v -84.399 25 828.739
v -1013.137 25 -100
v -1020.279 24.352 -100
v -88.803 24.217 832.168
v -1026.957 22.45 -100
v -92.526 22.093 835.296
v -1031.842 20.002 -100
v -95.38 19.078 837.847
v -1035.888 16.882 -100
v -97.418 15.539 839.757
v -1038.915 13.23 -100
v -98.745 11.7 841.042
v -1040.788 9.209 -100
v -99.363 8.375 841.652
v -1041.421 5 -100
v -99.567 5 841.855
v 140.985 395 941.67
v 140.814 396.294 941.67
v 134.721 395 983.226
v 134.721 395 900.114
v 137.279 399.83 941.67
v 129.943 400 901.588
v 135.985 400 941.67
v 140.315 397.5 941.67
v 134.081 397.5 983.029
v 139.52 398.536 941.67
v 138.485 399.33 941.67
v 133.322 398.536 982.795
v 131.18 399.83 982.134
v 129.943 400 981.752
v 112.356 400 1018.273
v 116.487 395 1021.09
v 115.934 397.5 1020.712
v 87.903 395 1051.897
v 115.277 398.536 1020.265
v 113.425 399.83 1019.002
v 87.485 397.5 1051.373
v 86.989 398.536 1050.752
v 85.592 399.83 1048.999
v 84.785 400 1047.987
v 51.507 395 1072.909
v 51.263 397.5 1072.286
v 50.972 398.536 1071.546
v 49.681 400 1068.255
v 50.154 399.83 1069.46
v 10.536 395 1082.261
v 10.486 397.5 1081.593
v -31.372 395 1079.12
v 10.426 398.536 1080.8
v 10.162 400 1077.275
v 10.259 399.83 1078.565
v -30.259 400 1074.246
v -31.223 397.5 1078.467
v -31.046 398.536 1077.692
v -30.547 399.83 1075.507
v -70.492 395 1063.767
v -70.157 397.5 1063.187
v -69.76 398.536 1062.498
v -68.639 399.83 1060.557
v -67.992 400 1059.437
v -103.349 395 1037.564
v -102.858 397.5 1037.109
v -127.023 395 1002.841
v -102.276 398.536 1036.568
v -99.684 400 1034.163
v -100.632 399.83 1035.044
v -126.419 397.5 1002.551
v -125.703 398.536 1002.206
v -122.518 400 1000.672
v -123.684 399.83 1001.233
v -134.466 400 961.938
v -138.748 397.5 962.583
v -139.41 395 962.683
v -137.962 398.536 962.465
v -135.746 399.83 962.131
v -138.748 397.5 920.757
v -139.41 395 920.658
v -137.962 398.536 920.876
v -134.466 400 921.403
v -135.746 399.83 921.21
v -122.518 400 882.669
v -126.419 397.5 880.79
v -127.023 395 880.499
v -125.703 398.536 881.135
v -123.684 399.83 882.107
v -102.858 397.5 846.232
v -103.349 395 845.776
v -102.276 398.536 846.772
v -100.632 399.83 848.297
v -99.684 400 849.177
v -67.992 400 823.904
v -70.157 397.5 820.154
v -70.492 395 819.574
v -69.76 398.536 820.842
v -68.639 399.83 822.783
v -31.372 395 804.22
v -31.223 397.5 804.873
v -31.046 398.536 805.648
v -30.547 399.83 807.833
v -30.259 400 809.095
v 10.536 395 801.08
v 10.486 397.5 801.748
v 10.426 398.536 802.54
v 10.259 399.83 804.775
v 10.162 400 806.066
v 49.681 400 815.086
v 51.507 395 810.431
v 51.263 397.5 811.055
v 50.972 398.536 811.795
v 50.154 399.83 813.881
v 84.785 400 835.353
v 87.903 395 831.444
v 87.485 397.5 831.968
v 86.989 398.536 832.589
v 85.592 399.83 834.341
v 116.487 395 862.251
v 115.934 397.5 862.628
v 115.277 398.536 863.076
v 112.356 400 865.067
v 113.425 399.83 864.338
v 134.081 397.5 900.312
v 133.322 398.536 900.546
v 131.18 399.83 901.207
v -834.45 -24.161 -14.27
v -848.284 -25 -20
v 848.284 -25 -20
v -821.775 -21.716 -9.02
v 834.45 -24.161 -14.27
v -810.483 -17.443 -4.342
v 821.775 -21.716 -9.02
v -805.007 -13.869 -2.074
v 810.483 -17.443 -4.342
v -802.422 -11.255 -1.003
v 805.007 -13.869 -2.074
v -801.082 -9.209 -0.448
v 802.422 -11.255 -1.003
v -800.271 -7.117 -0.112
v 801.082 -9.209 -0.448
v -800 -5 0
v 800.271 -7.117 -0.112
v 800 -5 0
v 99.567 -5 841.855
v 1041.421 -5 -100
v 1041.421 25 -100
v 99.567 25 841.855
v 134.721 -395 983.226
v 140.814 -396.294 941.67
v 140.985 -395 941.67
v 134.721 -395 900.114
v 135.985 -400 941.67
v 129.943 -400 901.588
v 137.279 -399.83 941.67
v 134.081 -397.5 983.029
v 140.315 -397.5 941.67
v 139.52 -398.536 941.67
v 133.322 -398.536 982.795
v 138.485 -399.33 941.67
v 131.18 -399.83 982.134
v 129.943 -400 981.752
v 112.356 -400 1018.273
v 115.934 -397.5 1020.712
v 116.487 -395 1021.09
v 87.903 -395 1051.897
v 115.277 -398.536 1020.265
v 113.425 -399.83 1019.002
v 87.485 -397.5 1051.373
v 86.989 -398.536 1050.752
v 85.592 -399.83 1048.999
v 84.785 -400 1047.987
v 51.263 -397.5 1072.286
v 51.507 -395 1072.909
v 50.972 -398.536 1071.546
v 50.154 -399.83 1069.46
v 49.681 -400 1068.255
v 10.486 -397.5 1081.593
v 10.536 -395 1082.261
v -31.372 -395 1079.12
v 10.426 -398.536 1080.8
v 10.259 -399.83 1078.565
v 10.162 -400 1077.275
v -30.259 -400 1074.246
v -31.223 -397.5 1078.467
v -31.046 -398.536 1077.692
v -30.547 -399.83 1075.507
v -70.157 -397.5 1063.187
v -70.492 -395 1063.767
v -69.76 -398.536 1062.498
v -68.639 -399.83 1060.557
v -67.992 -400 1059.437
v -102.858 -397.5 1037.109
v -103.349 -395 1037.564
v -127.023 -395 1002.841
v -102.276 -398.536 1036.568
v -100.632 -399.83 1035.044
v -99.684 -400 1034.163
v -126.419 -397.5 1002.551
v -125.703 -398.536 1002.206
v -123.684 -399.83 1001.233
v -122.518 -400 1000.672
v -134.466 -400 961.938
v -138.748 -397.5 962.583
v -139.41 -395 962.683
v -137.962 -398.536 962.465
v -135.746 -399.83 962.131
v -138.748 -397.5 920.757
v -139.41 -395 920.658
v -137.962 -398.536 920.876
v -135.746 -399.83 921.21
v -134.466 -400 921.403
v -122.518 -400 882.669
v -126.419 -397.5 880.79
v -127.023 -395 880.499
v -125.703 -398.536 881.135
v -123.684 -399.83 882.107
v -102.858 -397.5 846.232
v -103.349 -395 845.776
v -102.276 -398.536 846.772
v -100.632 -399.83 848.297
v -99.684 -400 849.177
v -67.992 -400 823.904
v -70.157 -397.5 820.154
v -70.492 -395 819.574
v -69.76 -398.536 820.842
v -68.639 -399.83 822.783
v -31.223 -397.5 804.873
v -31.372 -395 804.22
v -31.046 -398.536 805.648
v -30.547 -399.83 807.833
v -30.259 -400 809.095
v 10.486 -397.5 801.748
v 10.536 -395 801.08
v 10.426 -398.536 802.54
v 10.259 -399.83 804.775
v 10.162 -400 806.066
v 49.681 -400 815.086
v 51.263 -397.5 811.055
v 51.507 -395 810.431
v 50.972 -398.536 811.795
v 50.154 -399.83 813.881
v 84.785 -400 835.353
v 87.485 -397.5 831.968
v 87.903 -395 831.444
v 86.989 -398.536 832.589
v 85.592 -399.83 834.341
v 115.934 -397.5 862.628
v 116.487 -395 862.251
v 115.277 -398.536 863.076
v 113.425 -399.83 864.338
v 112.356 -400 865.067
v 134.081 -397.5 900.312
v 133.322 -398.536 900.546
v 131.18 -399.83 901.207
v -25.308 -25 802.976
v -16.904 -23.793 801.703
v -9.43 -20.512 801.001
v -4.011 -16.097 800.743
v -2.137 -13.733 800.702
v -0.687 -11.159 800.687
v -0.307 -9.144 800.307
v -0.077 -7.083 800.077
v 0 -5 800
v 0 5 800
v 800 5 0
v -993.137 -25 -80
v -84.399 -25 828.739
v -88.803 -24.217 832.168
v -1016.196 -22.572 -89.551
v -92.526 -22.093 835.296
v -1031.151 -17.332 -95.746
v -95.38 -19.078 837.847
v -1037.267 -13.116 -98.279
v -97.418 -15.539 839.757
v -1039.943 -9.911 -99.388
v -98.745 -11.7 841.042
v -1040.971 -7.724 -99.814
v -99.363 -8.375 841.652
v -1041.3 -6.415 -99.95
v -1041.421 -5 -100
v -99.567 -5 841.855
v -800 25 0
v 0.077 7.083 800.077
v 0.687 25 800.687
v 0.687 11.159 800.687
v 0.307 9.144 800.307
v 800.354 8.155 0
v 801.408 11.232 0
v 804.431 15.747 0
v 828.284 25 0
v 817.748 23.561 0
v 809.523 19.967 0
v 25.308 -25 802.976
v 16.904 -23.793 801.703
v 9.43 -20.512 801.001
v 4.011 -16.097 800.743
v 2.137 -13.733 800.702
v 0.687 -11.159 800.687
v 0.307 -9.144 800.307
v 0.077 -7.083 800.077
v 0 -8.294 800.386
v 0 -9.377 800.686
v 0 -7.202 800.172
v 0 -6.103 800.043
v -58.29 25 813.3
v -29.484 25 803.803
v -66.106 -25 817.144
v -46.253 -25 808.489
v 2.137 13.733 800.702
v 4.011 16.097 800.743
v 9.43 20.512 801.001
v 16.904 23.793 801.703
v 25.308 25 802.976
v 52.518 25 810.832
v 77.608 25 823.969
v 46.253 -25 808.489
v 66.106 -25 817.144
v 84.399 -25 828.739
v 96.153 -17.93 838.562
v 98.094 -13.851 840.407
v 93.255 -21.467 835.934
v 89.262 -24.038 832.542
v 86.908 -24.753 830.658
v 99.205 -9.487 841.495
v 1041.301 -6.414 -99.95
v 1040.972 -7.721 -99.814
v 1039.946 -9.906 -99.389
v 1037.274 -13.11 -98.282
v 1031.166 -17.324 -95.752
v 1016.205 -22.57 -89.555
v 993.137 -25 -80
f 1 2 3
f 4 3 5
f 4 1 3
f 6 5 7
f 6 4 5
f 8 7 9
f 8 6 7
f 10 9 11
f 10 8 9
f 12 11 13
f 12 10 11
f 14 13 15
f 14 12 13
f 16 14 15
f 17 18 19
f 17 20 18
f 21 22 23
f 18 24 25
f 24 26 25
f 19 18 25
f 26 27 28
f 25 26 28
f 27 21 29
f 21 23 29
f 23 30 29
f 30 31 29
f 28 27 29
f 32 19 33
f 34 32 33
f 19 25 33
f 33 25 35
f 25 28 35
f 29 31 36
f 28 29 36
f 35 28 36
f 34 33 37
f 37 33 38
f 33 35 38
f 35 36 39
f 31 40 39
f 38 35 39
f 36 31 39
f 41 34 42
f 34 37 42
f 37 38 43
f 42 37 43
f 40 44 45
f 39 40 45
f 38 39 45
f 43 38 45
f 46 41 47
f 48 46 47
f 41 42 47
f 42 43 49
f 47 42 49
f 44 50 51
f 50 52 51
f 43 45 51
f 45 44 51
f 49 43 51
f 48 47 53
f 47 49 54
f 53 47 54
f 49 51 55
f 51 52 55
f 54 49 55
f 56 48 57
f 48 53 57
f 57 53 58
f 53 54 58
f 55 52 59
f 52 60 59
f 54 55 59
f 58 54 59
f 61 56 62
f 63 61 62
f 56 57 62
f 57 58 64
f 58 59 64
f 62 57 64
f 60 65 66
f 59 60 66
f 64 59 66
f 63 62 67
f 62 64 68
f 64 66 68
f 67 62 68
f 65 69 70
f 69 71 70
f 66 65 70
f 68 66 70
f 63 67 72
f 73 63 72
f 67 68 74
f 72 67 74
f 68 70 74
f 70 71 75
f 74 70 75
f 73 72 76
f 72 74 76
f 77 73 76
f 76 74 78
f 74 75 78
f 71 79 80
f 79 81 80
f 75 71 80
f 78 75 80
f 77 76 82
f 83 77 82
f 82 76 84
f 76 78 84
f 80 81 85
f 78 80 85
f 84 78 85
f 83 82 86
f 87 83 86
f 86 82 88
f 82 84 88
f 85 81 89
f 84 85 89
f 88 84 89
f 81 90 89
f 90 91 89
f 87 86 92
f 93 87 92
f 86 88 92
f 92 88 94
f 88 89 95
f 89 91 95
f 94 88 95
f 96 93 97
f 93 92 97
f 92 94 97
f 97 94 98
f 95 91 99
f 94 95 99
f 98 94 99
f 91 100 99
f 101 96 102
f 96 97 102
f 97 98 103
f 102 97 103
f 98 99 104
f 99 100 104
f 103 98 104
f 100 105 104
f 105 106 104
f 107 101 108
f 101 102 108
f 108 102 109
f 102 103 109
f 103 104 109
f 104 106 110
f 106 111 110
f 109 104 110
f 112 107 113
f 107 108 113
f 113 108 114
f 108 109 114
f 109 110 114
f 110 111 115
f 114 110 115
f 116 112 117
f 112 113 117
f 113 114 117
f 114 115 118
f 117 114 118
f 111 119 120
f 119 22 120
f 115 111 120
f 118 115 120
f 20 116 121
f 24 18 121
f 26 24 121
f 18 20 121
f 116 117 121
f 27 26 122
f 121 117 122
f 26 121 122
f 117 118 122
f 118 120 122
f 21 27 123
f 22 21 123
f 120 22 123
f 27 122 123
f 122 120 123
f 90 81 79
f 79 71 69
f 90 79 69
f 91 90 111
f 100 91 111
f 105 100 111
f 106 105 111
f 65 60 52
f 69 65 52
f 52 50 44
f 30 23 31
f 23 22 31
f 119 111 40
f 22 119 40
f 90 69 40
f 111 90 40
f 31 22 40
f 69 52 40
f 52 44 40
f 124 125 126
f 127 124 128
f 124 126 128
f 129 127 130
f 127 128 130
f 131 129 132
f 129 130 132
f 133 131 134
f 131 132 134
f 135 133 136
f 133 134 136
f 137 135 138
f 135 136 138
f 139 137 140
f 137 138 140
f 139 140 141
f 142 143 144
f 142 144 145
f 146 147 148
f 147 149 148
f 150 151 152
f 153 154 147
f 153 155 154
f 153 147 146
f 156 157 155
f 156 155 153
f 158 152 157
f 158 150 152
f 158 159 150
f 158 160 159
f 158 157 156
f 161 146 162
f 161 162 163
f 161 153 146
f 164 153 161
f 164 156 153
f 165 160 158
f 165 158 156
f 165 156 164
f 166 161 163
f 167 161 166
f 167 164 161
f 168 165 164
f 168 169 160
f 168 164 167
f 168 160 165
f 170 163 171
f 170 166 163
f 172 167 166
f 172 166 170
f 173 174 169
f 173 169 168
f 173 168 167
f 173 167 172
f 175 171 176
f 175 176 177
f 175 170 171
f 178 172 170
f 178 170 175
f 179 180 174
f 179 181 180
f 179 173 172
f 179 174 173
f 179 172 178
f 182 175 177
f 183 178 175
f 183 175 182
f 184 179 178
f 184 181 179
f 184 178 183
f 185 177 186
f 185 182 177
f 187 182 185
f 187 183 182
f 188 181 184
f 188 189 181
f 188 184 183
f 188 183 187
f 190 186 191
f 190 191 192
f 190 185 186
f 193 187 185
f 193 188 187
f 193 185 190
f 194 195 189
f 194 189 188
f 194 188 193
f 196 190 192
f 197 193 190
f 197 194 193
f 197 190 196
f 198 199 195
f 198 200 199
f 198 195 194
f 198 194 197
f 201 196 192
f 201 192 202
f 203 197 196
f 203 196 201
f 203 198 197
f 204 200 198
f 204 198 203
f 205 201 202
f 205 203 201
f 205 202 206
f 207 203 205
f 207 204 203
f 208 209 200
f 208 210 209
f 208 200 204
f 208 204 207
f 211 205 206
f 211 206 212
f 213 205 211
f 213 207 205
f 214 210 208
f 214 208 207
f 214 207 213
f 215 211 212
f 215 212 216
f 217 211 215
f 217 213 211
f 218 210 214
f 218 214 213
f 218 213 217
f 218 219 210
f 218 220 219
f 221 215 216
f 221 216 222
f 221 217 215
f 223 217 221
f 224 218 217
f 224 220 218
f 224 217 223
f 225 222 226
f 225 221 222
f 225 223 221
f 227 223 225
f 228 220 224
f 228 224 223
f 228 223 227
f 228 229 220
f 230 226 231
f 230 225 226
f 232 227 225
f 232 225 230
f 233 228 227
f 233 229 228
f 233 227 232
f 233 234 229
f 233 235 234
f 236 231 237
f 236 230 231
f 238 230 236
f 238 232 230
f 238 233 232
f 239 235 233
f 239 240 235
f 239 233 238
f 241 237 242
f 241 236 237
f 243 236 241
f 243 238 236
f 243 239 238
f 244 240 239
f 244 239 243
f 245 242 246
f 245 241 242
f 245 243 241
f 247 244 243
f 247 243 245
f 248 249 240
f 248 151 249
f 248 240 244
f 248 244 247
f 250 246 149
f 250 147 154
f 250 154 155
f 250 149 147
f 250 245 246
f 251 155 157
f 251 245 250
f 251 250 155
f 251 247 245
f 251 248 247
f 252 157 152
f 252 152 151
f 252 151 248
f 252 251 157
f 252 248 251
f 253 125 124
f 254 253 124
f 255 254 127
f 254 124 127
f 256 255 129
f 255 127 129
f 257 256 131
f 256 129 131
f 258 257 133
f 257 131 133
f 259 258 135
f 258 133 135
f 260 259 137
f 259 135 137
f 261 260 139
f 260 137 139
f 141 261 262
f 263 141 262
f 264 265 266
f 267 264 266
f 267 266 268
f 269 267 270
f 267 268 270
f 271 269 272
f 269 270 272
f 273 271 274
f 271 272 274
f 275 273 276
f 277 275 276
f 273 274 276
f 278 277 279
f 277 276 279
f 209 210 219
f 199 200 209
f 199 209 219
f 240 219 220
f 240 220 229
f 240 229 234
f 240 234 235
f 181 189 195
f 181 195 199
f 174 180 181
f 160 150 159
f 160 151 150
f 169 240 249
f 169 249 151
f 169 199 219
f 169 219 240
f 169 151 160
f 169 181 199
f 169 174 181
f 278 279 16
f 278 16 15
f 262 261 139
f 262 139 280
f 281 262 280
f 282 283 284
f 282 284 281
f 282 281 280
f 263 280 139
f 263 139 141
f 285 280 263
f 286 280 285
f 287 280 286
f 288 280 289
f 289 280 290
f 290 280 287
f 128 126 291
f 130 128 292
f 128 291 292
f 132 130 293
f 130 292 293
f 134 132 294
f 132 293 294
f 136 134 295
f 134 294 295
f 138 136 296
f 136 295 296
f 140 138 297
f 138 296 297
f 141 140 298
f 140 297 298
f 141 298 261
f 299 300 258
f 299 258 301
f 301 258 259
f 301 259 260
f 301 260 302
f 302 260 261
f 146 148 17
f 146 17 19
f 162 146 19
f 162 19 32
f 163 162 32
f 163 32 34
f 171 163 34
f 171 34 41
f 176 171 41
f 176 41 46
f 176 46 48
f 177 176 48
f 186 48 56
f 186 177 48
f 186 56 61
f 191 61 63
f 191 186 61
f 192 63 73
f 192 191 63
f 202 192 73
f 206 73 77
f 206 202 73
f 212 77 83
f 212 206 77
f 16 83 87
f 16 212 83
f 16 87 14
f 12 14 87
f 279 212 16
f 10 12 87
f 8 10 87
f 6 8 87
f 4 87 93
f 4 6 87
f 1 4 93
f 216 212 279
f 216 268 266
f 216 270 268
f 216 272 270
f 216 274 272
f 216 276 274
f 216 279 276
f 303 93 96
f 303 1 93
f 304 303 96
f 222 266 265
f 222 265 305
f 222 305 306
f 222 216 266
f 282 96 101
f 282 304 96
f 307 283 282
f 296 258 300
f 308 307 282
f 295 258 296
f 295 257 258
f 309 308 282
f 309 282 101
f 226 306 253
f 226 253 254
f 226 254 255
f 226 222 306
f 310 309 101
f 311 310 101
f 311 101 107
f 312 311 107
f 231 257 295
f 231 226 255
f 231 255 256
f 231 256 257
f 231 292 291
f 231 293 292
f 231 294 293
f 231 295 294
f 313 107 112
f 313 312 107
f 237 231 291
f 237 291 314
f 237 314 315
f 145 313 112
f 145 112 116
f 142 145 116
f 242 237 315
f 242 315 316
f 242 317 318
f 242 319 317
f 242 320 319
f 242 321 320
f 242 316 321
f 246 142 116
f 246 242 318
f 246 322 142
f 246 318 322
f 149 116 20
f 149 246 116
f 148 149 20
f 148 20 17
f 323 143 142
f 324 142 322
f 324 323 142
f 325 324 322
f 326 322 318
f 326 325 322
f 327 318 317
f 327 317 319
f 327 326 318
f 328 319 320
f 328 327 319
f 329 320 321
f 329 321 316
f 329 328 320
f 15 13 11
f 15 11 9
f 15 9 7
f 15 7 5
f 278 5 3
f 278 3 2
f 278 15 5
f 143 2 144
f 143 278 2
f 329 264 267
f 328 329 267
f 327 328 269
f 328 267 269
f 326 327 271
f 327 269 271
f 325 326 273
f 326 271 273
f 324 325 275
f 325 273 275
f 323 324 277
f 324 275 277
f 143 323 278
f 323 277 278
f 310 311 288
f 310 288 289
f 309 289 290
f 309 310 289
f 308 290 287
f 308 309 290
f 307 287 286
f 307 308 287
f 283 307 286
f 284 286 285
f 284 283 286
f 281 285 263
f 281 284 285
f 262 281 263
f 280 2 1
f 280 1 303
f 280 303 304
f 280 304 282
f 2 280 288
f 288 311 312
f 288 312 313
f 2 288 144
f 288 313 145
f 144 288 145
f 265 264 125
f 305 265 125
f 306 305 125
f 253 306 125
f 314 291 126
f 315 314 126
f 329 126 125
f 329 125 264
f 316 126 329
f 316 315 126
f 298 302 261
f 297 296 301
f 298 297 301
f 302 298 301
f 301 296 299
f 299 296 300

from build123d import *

# Parameters (mm, degrees)
F1_R         = 140.9846966486
F2_DEPTH     = 400
F3_DEPTH     = 25
F4_T1_DEPTH  = 2182.8427124746
F4_T6_DEPTH  = 1431.9836481951
F4_S7_R      = 140.9846966486
F4_T8_DEPTH  = 728
F4_T12_DEPTH = 1181.3708498985
F4_S13_R     = 140.9846966486
F4_T14_DEPTH = 602
F4_T19_DEPTH = 1431.9836481951
F4_S20_R     = 140.9846966486
F4_T21_DEPTH = 728
F4_T25_DEPTH = 1700
F4_T31_DEPTH = 1181.3708498985
F4_S32_R     = 140.9846966486
F4_T33_DEPTH = 602
F4_T38_DEPTH = 1181.3708498985
F4_S39_R     = 140.9846966486
F4_T40_DEPTH = 602
F4_T45_DEPTH = 1431.9836481951
F4_S46_R     = 140.9846966486
F4_T47_DEPTH = 728
F4_T52_DEPTH = 1700
F4_T56_DEPTH = 1181.3708498985
F4_T63_DEPTH = 1231.3708498985
F4_S64_R     = 140.9846966486
F4_T65_DEPTH = 627
F4_T69_DEPTH = 1231.3708498985
F4_S70_R     = 140.9846966486
F4_T71_DEPTH = 627
F4_T78_DEPTH = 1700
F4_T82_DEPTH = 1181.3708498985
F5_R         = 5


# Not quite as in the source:
# - a fillet or chamfer that OpenCascade refuses, or shapes differently, is made with other operations: its cross-section is extruded or revolved along the edge and cut away or added


with BuildPart() as f2:
    # F1 (on face) → F2 (new body, symmetric)
    with BuildSketch(Plane.XZ):
        with Locations((0, 941.6702985764)):
            Circle(F1_R)
    extrude(amount=F2_DEPTH, both=True)

    # F0 (on Front) → F3 (join, symmetric)
    with BuildSketch(Plane.XZ):
        Polygon((0, -100), (1041.4213562373, -100), (0, 941.4213562373), (-1041.4213562373, -100), align=None)
        Polygon((800, 0), (0, 0), (-800, 0), (0, 800), align=None, mode=Mode.SUBTRACT)
    extrude(amount=F3_DEPTH, both=True)

    # F4: fillet of radius 20 on 8 edges, made by hand

    # F4_s2 → F4_t1 (cut)
    with BuildSketch(Plane.YZ.offset(-1091.4213562373)):
        with BuildLine():
            ThreePointArc((-25, -80), (-19.1421356237, -94.1421356237), (-5, -100))
            Line((-5, -100), (-25, -100))
            Line((-25, -100), (-25, -80))
        make_face()
    extrude(amount=F4_T1_DEPTH, mode=Mode.SUBTRACT)


with BuildPart() as f4_tool4:
    # F4_s5 → F4_t6 (new body)
    with BuildSketch(Plane(origin=(406.4993310091, 0, 406.4993310091), x_dir=(0, 1, 0), z_dir=(-0.7071067812, 0, -0.7071067812))):
        with BuildLine():
            ThreePointArc((-25, -645.6854249492), (-19.1421356237, -659.827560573), (-5, -665.6854249492))
            Line((-5, -665.6854249492), (-25, -665.6854249492))
            Line((-25, -665.6854249492), (-25, -645.6854249492))
        make_face()
    extrude(amount=F4_T6_DEPTH)

    # F4_s7 → F4_t8 (cut, symmetric)
    with BuildSketch(Plane.XZ.offset(15)):
        with Locations((0, 941.6702985764)):
            Circle(F4_S7_R)
    extrude(amount=F4_T8_DEPTH, both=True, mode=Mode.SUBTRACT)


with BuildPart() as f2_1:
    add(f2.part)

    # F4_t3: cut F4_tool4
    add(f4_tool4.part, mode=Mode.SUBTRACT)


with BuildPart() as f4_tool10:
    # F4_s11 → F4_t12 (new body)
    with BuildSketch(Plane(origin=(-435.3553390593, 0, -435.3553390593), x_dir=(0, 1, 0), z_dir=(0.7071067812, 0, 0.7071067812))):
        with BuildLine():
            ThreePointArc((-25, 585.6854249492), (-19.1421356237, 571.5432893255), (-5, 565.6854249492))
            Line((-5, 565.6854249492), (-25, 565.6854249492))
            Line((-25, 565.6854249492), (-25, 585.6854249492))
        make_face()
    extrude(amount=F4_T12_DEPTH)

    # F4_s13 → F4_t14 (cut, symmetric)
    with BuildSketch(Plane.XZ.offset(15)):
        with Locations((0, 941.6702985764)):
            Circle(F4_S13_R)
    extrude(amount=F4_T14_DEPTH, both=True, mode=Mode.SUBTRACT)

    split(bisect_by=Plane.XY, keep=Keep.TOP)


with BuildPart() as f2_2:
    add(f2_1.part)

    # F4_t9: cut F4_tool10
    add(f4_tool10.part, mode=Mode.SUBTRACT)


with BuildPart() as f4_tool17:
    # F4_s18 → F4_t19 (new body)
    with BuildSketch(Plane(origin=(406.4993310091, 0, 406.4993310091), x_dir=(0, 1, 0), z_dir=(-0.7071067812, 0, -0.7071067812))):
        with BuildLine():
            ThreePointArc((25, -645.6854249492), (19.1421356237, -659.827560573), (5, -665.6854249492))
            Line((5, -665.6854249492), (25, -665.6854249492))
            Line((25, -665.6854249492), (25, -645.6854249492))
        make_face()
    extrude(amount=F4_T19_DEPTH)

    # F4_s20 → F4_t21 (cut, symmetric)
    with BuildSketch(Plane.XZ.offset(-15)):
        with Locations((0, 941.6702985764)):
            Circle(F4_S20_R)
    extrude(amount=F4_T21_DEPTH, both=True, mode=Mode.SUBTRACT)


with BuildPart() as f2_3:
    add(f2_2.part)

    # F4_t16: cut F4_tool17
    add(f4_tool17.part, mode=Mode.SUBTRACT)


with BuildPart() as f4_tool23:
    # F4_s24 → F4_t25 (new body)
    with BuildSketch(Plane.YZ.offset(850)):
        with BuildLine():
            ThreePointArc((-25, -20), (-19.1421356237, -5.8578643763), (-5, 0))
            Line((-5, 0), (-25, 0))
            Line((-25, 0), (-25, -20))
        make_face()
    extrude(amount=-F4_T25_DEPTH)

    split(bisect_by=Plane(origin=(-400, 0, 400), x_dir=(0, 1, 0), z_dir=(0.7071067812, 0, -0.7071067812)), keep=Keep.TOP)

    split(bisect_by=Plane(origin=(400, 0, 400), x_dir=(0, 1, 0), z_dir=(-0.7071067812, 0, -0.7071067812)), keep=Keep.TOP)


with BuildPart() as f2_4:
    add(f2_3.part)

    # F4_t22: cut F4_tool23
    add(f4_tool23.part, mode=Mode.SUBTRACT)


with BuildPart() as f4_tool29:
    # F4_s30 → F4_t31 (new body)
    with BuildSketch(Plane(origin=(-400, 0, 400), x_dir=(0, 1, 0), z_dir=(0.7071067812, 0, -0.7071067812))):
        with BuildLine():
            ThreePointArc((-25, 585.6854249492), (-19.1421356237, 571.5432893255), (-5, 565.6854249492))
            Line((-5, 565.6854249492), (-25, 565.6854249492))
            Line((-25, 565.6854249492), (-25, 585.6854249492))
        make_face()
    extrude(amount=F4_T31_DEPTH)

    # F4_s32 → F4_t33 (cut, symmetric)
    with BuildSketch(Plane.XZ.offset(15)):
        with Locations((0, 941.6702985764)):
            Circle(F4_S32_R)
    extrude(amount=F4_T33_DEPTH, both=True, mode=Mode.SUBTRACT)

    split(bisect_by=Plane.XY, keep=Keep.TOP)


with BuildPart() as f2_5:
    add(f2_4.part)

    # F4_t28: cut F4_tool29
    add(f4_tool29.part, mode=Mode.SUBTRACT)


with BuildPart() as f4_tool36:
    # F4_s37 → F4_t38 (new body)
    with BuildSketch(Plane(origin=(-400, 0, 400), x_dir=(0, 1, 0), z_dir=(0.7071067812, 0, -0.7071067812))):
        with BuildLine():
            ThreePointArc((25, 585.6854249492), (19.1421356237, 571.5432893255), (5, 565.6854249492))
            Line((5, 565.6854249492), (25, 565.6854249492))
            Line((25, 565.6854249492), (25, 585.6854249492))
        make_face()
    extrude(amount=F4_T38_DEPTH)

    # F4_s39 → F4_t40 (cut, symmetric)
    with BuildSketch(Plane.XZ.offset(-15)):
        with Locations((0, 941.6702985764)):
            Circle(F4_S39_R)
    extrude(amount=F4_T40_DEPTH, both=True, mode=Mode.SUBTRACT)

    split(bisect_by=Plane.XY, keep=Keep.TOP)


with BuildPart() as f2_6:
    add(f2_5.part)

    # F4_t35: cut F4_tool36
    add(f4_tool36.part, mode=Mode.SUBTRACT)


with BuildPart() as f4_tool43:
    # F4_s44 → F4_t45 (new body)
    with BuildSketch(Plane(origin=(606.066017178, 0, -606.066017178), x_dir=(0, 1, 0), z_dir=(-0.7071067812, 0, 0.7071067812))):
        with BuildLine():
            ThreePointArc((-5, -665.6854249492), (-19.1421356237, -659.827560573), (-25, -645.6854249492))
            Line((-25, -645.6854249492), (-25, -665.6854249492))
            Line((-25, -665.6854249492), (-5, -665.6854249492))
        make_face()
    extrude(amount=F4_T45_DEPTH)

    # F4_s46 → F4_t47 (cut, symmetric)
    with BuildSketch(Plane.XZ.offset(15)):
        with Locations((0, 941.6702985764)):
            Circle(F4_S46_R)
    extrude(amount=F4_T47_DEPTH, both=True, mode=Mode.SUBTRACT)


with BuildPart() as f2_7:
    add(f2_6.part)

    # F4_t42: cut F4_tool43
    add(f4_tool43.part, mode=Mode.SUBTRACT)


with BuildPart() as f4_tool50:
    # F4_s51 → F4_t52 (new body)
    with BuildSketch(Plane.YZ.offset(850)):
        with BuildLine():
            ThreePointArc((-25, -20), (-19.1421356237, -5.8578643763), (-5, 0))
            Line((-5, 0), (-25, 0))
            Line((-25, 0), (-25, -20))
        make_face()
    extrude(amount=-F4_T52_DEPTH)

    split(bisect_by=Plane(origin=(-400, 0, 400), x_dir=(0, 1, 0), z_dir=(-0.7071067812, 0, 0.7071067812)), keep=Keep.TOP)


with BuildPart() as f4_tool54:
    # F4_s55 → F4_t56 (new body)
    with BuildSketch(Plane(origin=(-435.3553390593, 0, -435.3553390593), x_dir=(0, 1, 0), z_dir=(0.7071067812, 0, 0.7071067812))):
        with BuildLine():
            ThreePointArc((-25, 585.6854249492), (-19.1421356237, 571.5432893255), (-5, 565.6854249492))
            Line((-5, 565.6854249492), (-25, 565.6854249492))
            Line((-25, 565.6854249492), (-25, 585.6854249492))
        make_face()
    extrude(amount=F4_T56_DEPTH)

    split(bisect_by=Plane.XY, keep=Keep.BOTTOM)


with BuildPart() as f4_tool50_1:
    add(f4_tool50.part)

    # F4_t58: intersect F4_tool54
    add(f4_tool54.part, mode=Mode.INTERSECT)


with BuildPart() as f2_8:
    add(f2_7.part)

    # F4_t48: cut F4_tool50
    add(f4_tool50_1.part, mode=Mode.SUBTRACT)


with BuildPart() as f4_tool61:
    # F4_s62 → F4_t63 (new body)
    with BuildSketch(Plane(origin=(-435.3553390593, 0, 435.3553390593), x_dir=(0, 1, 0), z_dir=(0.7071067812, 0, -0.7071067812))):
        with BuildLine():
            ThreePointArc((-25, 585.6854249492), (-19.1421356237, 571.5432893255), (-5, 565.6854249492))
            Line((-5, 565.6854249492), (-25, 565.6854249492))
            Line((-25, 565.6854249492), (-25, 585.6854249492))
        make_face()
    extrude(amount=F4_T63_DEPTH)

    # F4_s64 → F4_t65 (cut, symmetric)
    with BuildSketch(Plane.XZ.offset(15)):
        with Locations((0, 941.6702985764)):
            Circle(F4_S64_R)
    extrude(amount=F4_T65_DEPTH, both=True, mode=Mode.SUBTRACT)

    split(bisect_by=Plane(origin=(-400, 0, 400), x_dir=(0, 1, 0), z_dir=(-0.7071067812, 0, 0.7071067812)), keep=Keep.TOP)


with BuildPart() as f4_tool67:
    # F4_s68 → F4_t69 (new body)
    with BuildSketch(Plane(origin=(-435.3553390593, 0, -435.3553390593), x_dir=(0, 1, 0), z_dir=(0.7071067812, 0, 0.7071067812))):
        with BuildLine():
            ThreePointArc((-25, 585.6854249492), (-19.1421356237, 571.5432893255), (-5, 565.6854249492))
            Line((-5, 565.6854249492), (-25, 565.6854249492))
            Line((-25, 565.6854249492), (-25, 585.6854249492))
        make_face()
    extrude(amount=F4_T69_DEPTH)

    # F4_s70 → F4_t71 (cut, symmetric)
    with BuildSketch(Plane.XZ.offset(15)):
        with Locations((0, 941.6702985764)):
            Circle(F4_S70_R)
    extrude(amount=F4_T71_DEPTH, both=True, mode=Mode.SUBTRACT)

    split(bisect_by=Plane(origin=(400, 0, 400), x_dir=(0, 1, 0), z_dir=(0.7071067812, 0, 0.7071067812)), keep=Keep.TOP)


with BuildPart() as f4_tool61_1:
    add(f4_tool61.part)

    # F4_t73: intersect F4_tool67
    add(f4_tool67.part, mode=Mode.INTERSECT)


with BuildPart() as f2_9:
    add(f2_8.part)

    # F4_t59: cut F4_tool61
    add(f4_tool61_1.part, mode=Mode.SUBTRACT)


with BuildPart() as f4_tool76:
    # F4_s77 → F4_t78 (new body)
    with BuildSketch(Plane.YZ.offset(850)):
        with BuildLine():
            ThreePointArc((-25, -20), (-19.1421356237, -5.8578643763), (-5, 0))
            Line((-5, 0), (-25, 0))
            Line((-25, 0), (-25, -20))
        make_face()
    extrude(amount=-F4_T78_DEPTH)

    split(bisect_by=Plane(origin=(400, 0, 400), x_dir=(0, 1, 0), z_dir=(0.7071067812, 0, 0.7071067812)), keep=Keep.TOP)


with BuildPart() as f4_tool80:
    # F4_s81 → F4_t82 (new body)
    with BuildSketch(Plane(origin=(-400, 0, 400), x_dir=(0, 1, 0), z_dir=(0.7071067812, 0, -0.7071067812))):
        with BuildLine():
            ThreePointArc((-25, 585.6854249492), (-19.1421356237, 571.5432893255), (-5, 565.6854249492))
            Line((-5, 565.6854249492), (-25, 565.6854249492))
            Line((-25, 565.6854249492), (-25, 585.6854249492))
        make_face()
    extrude(amount=F4_T82_DEPTH)

    split(bisect_by=Plane.XY, keep=Keep.BOTTOM)


with BuildPart() as f4_tool76_1:
    add(f4_tool76.part)

    # F4_t84: intersect F4_tool80
    add(f4_tool80.part, mode=Mode.INTERSECT)


with BuildPart() as f2_10:
    add(f2_9.part)

    # F4_t74: cut F4_tool76
    add(f4_tool76_1.part, mode=Mode.SUBTRACT)

    # F5
    f5_edges = [f2_10.edges().sort_by_distance(p)[0] for p in [
        (-140.984697, 400, 941.670299),
        (-140.984697, -400, 941.670299),
    ]]
    fillet(f5_edges, radius=F5_R)


solid = f2_10.part
